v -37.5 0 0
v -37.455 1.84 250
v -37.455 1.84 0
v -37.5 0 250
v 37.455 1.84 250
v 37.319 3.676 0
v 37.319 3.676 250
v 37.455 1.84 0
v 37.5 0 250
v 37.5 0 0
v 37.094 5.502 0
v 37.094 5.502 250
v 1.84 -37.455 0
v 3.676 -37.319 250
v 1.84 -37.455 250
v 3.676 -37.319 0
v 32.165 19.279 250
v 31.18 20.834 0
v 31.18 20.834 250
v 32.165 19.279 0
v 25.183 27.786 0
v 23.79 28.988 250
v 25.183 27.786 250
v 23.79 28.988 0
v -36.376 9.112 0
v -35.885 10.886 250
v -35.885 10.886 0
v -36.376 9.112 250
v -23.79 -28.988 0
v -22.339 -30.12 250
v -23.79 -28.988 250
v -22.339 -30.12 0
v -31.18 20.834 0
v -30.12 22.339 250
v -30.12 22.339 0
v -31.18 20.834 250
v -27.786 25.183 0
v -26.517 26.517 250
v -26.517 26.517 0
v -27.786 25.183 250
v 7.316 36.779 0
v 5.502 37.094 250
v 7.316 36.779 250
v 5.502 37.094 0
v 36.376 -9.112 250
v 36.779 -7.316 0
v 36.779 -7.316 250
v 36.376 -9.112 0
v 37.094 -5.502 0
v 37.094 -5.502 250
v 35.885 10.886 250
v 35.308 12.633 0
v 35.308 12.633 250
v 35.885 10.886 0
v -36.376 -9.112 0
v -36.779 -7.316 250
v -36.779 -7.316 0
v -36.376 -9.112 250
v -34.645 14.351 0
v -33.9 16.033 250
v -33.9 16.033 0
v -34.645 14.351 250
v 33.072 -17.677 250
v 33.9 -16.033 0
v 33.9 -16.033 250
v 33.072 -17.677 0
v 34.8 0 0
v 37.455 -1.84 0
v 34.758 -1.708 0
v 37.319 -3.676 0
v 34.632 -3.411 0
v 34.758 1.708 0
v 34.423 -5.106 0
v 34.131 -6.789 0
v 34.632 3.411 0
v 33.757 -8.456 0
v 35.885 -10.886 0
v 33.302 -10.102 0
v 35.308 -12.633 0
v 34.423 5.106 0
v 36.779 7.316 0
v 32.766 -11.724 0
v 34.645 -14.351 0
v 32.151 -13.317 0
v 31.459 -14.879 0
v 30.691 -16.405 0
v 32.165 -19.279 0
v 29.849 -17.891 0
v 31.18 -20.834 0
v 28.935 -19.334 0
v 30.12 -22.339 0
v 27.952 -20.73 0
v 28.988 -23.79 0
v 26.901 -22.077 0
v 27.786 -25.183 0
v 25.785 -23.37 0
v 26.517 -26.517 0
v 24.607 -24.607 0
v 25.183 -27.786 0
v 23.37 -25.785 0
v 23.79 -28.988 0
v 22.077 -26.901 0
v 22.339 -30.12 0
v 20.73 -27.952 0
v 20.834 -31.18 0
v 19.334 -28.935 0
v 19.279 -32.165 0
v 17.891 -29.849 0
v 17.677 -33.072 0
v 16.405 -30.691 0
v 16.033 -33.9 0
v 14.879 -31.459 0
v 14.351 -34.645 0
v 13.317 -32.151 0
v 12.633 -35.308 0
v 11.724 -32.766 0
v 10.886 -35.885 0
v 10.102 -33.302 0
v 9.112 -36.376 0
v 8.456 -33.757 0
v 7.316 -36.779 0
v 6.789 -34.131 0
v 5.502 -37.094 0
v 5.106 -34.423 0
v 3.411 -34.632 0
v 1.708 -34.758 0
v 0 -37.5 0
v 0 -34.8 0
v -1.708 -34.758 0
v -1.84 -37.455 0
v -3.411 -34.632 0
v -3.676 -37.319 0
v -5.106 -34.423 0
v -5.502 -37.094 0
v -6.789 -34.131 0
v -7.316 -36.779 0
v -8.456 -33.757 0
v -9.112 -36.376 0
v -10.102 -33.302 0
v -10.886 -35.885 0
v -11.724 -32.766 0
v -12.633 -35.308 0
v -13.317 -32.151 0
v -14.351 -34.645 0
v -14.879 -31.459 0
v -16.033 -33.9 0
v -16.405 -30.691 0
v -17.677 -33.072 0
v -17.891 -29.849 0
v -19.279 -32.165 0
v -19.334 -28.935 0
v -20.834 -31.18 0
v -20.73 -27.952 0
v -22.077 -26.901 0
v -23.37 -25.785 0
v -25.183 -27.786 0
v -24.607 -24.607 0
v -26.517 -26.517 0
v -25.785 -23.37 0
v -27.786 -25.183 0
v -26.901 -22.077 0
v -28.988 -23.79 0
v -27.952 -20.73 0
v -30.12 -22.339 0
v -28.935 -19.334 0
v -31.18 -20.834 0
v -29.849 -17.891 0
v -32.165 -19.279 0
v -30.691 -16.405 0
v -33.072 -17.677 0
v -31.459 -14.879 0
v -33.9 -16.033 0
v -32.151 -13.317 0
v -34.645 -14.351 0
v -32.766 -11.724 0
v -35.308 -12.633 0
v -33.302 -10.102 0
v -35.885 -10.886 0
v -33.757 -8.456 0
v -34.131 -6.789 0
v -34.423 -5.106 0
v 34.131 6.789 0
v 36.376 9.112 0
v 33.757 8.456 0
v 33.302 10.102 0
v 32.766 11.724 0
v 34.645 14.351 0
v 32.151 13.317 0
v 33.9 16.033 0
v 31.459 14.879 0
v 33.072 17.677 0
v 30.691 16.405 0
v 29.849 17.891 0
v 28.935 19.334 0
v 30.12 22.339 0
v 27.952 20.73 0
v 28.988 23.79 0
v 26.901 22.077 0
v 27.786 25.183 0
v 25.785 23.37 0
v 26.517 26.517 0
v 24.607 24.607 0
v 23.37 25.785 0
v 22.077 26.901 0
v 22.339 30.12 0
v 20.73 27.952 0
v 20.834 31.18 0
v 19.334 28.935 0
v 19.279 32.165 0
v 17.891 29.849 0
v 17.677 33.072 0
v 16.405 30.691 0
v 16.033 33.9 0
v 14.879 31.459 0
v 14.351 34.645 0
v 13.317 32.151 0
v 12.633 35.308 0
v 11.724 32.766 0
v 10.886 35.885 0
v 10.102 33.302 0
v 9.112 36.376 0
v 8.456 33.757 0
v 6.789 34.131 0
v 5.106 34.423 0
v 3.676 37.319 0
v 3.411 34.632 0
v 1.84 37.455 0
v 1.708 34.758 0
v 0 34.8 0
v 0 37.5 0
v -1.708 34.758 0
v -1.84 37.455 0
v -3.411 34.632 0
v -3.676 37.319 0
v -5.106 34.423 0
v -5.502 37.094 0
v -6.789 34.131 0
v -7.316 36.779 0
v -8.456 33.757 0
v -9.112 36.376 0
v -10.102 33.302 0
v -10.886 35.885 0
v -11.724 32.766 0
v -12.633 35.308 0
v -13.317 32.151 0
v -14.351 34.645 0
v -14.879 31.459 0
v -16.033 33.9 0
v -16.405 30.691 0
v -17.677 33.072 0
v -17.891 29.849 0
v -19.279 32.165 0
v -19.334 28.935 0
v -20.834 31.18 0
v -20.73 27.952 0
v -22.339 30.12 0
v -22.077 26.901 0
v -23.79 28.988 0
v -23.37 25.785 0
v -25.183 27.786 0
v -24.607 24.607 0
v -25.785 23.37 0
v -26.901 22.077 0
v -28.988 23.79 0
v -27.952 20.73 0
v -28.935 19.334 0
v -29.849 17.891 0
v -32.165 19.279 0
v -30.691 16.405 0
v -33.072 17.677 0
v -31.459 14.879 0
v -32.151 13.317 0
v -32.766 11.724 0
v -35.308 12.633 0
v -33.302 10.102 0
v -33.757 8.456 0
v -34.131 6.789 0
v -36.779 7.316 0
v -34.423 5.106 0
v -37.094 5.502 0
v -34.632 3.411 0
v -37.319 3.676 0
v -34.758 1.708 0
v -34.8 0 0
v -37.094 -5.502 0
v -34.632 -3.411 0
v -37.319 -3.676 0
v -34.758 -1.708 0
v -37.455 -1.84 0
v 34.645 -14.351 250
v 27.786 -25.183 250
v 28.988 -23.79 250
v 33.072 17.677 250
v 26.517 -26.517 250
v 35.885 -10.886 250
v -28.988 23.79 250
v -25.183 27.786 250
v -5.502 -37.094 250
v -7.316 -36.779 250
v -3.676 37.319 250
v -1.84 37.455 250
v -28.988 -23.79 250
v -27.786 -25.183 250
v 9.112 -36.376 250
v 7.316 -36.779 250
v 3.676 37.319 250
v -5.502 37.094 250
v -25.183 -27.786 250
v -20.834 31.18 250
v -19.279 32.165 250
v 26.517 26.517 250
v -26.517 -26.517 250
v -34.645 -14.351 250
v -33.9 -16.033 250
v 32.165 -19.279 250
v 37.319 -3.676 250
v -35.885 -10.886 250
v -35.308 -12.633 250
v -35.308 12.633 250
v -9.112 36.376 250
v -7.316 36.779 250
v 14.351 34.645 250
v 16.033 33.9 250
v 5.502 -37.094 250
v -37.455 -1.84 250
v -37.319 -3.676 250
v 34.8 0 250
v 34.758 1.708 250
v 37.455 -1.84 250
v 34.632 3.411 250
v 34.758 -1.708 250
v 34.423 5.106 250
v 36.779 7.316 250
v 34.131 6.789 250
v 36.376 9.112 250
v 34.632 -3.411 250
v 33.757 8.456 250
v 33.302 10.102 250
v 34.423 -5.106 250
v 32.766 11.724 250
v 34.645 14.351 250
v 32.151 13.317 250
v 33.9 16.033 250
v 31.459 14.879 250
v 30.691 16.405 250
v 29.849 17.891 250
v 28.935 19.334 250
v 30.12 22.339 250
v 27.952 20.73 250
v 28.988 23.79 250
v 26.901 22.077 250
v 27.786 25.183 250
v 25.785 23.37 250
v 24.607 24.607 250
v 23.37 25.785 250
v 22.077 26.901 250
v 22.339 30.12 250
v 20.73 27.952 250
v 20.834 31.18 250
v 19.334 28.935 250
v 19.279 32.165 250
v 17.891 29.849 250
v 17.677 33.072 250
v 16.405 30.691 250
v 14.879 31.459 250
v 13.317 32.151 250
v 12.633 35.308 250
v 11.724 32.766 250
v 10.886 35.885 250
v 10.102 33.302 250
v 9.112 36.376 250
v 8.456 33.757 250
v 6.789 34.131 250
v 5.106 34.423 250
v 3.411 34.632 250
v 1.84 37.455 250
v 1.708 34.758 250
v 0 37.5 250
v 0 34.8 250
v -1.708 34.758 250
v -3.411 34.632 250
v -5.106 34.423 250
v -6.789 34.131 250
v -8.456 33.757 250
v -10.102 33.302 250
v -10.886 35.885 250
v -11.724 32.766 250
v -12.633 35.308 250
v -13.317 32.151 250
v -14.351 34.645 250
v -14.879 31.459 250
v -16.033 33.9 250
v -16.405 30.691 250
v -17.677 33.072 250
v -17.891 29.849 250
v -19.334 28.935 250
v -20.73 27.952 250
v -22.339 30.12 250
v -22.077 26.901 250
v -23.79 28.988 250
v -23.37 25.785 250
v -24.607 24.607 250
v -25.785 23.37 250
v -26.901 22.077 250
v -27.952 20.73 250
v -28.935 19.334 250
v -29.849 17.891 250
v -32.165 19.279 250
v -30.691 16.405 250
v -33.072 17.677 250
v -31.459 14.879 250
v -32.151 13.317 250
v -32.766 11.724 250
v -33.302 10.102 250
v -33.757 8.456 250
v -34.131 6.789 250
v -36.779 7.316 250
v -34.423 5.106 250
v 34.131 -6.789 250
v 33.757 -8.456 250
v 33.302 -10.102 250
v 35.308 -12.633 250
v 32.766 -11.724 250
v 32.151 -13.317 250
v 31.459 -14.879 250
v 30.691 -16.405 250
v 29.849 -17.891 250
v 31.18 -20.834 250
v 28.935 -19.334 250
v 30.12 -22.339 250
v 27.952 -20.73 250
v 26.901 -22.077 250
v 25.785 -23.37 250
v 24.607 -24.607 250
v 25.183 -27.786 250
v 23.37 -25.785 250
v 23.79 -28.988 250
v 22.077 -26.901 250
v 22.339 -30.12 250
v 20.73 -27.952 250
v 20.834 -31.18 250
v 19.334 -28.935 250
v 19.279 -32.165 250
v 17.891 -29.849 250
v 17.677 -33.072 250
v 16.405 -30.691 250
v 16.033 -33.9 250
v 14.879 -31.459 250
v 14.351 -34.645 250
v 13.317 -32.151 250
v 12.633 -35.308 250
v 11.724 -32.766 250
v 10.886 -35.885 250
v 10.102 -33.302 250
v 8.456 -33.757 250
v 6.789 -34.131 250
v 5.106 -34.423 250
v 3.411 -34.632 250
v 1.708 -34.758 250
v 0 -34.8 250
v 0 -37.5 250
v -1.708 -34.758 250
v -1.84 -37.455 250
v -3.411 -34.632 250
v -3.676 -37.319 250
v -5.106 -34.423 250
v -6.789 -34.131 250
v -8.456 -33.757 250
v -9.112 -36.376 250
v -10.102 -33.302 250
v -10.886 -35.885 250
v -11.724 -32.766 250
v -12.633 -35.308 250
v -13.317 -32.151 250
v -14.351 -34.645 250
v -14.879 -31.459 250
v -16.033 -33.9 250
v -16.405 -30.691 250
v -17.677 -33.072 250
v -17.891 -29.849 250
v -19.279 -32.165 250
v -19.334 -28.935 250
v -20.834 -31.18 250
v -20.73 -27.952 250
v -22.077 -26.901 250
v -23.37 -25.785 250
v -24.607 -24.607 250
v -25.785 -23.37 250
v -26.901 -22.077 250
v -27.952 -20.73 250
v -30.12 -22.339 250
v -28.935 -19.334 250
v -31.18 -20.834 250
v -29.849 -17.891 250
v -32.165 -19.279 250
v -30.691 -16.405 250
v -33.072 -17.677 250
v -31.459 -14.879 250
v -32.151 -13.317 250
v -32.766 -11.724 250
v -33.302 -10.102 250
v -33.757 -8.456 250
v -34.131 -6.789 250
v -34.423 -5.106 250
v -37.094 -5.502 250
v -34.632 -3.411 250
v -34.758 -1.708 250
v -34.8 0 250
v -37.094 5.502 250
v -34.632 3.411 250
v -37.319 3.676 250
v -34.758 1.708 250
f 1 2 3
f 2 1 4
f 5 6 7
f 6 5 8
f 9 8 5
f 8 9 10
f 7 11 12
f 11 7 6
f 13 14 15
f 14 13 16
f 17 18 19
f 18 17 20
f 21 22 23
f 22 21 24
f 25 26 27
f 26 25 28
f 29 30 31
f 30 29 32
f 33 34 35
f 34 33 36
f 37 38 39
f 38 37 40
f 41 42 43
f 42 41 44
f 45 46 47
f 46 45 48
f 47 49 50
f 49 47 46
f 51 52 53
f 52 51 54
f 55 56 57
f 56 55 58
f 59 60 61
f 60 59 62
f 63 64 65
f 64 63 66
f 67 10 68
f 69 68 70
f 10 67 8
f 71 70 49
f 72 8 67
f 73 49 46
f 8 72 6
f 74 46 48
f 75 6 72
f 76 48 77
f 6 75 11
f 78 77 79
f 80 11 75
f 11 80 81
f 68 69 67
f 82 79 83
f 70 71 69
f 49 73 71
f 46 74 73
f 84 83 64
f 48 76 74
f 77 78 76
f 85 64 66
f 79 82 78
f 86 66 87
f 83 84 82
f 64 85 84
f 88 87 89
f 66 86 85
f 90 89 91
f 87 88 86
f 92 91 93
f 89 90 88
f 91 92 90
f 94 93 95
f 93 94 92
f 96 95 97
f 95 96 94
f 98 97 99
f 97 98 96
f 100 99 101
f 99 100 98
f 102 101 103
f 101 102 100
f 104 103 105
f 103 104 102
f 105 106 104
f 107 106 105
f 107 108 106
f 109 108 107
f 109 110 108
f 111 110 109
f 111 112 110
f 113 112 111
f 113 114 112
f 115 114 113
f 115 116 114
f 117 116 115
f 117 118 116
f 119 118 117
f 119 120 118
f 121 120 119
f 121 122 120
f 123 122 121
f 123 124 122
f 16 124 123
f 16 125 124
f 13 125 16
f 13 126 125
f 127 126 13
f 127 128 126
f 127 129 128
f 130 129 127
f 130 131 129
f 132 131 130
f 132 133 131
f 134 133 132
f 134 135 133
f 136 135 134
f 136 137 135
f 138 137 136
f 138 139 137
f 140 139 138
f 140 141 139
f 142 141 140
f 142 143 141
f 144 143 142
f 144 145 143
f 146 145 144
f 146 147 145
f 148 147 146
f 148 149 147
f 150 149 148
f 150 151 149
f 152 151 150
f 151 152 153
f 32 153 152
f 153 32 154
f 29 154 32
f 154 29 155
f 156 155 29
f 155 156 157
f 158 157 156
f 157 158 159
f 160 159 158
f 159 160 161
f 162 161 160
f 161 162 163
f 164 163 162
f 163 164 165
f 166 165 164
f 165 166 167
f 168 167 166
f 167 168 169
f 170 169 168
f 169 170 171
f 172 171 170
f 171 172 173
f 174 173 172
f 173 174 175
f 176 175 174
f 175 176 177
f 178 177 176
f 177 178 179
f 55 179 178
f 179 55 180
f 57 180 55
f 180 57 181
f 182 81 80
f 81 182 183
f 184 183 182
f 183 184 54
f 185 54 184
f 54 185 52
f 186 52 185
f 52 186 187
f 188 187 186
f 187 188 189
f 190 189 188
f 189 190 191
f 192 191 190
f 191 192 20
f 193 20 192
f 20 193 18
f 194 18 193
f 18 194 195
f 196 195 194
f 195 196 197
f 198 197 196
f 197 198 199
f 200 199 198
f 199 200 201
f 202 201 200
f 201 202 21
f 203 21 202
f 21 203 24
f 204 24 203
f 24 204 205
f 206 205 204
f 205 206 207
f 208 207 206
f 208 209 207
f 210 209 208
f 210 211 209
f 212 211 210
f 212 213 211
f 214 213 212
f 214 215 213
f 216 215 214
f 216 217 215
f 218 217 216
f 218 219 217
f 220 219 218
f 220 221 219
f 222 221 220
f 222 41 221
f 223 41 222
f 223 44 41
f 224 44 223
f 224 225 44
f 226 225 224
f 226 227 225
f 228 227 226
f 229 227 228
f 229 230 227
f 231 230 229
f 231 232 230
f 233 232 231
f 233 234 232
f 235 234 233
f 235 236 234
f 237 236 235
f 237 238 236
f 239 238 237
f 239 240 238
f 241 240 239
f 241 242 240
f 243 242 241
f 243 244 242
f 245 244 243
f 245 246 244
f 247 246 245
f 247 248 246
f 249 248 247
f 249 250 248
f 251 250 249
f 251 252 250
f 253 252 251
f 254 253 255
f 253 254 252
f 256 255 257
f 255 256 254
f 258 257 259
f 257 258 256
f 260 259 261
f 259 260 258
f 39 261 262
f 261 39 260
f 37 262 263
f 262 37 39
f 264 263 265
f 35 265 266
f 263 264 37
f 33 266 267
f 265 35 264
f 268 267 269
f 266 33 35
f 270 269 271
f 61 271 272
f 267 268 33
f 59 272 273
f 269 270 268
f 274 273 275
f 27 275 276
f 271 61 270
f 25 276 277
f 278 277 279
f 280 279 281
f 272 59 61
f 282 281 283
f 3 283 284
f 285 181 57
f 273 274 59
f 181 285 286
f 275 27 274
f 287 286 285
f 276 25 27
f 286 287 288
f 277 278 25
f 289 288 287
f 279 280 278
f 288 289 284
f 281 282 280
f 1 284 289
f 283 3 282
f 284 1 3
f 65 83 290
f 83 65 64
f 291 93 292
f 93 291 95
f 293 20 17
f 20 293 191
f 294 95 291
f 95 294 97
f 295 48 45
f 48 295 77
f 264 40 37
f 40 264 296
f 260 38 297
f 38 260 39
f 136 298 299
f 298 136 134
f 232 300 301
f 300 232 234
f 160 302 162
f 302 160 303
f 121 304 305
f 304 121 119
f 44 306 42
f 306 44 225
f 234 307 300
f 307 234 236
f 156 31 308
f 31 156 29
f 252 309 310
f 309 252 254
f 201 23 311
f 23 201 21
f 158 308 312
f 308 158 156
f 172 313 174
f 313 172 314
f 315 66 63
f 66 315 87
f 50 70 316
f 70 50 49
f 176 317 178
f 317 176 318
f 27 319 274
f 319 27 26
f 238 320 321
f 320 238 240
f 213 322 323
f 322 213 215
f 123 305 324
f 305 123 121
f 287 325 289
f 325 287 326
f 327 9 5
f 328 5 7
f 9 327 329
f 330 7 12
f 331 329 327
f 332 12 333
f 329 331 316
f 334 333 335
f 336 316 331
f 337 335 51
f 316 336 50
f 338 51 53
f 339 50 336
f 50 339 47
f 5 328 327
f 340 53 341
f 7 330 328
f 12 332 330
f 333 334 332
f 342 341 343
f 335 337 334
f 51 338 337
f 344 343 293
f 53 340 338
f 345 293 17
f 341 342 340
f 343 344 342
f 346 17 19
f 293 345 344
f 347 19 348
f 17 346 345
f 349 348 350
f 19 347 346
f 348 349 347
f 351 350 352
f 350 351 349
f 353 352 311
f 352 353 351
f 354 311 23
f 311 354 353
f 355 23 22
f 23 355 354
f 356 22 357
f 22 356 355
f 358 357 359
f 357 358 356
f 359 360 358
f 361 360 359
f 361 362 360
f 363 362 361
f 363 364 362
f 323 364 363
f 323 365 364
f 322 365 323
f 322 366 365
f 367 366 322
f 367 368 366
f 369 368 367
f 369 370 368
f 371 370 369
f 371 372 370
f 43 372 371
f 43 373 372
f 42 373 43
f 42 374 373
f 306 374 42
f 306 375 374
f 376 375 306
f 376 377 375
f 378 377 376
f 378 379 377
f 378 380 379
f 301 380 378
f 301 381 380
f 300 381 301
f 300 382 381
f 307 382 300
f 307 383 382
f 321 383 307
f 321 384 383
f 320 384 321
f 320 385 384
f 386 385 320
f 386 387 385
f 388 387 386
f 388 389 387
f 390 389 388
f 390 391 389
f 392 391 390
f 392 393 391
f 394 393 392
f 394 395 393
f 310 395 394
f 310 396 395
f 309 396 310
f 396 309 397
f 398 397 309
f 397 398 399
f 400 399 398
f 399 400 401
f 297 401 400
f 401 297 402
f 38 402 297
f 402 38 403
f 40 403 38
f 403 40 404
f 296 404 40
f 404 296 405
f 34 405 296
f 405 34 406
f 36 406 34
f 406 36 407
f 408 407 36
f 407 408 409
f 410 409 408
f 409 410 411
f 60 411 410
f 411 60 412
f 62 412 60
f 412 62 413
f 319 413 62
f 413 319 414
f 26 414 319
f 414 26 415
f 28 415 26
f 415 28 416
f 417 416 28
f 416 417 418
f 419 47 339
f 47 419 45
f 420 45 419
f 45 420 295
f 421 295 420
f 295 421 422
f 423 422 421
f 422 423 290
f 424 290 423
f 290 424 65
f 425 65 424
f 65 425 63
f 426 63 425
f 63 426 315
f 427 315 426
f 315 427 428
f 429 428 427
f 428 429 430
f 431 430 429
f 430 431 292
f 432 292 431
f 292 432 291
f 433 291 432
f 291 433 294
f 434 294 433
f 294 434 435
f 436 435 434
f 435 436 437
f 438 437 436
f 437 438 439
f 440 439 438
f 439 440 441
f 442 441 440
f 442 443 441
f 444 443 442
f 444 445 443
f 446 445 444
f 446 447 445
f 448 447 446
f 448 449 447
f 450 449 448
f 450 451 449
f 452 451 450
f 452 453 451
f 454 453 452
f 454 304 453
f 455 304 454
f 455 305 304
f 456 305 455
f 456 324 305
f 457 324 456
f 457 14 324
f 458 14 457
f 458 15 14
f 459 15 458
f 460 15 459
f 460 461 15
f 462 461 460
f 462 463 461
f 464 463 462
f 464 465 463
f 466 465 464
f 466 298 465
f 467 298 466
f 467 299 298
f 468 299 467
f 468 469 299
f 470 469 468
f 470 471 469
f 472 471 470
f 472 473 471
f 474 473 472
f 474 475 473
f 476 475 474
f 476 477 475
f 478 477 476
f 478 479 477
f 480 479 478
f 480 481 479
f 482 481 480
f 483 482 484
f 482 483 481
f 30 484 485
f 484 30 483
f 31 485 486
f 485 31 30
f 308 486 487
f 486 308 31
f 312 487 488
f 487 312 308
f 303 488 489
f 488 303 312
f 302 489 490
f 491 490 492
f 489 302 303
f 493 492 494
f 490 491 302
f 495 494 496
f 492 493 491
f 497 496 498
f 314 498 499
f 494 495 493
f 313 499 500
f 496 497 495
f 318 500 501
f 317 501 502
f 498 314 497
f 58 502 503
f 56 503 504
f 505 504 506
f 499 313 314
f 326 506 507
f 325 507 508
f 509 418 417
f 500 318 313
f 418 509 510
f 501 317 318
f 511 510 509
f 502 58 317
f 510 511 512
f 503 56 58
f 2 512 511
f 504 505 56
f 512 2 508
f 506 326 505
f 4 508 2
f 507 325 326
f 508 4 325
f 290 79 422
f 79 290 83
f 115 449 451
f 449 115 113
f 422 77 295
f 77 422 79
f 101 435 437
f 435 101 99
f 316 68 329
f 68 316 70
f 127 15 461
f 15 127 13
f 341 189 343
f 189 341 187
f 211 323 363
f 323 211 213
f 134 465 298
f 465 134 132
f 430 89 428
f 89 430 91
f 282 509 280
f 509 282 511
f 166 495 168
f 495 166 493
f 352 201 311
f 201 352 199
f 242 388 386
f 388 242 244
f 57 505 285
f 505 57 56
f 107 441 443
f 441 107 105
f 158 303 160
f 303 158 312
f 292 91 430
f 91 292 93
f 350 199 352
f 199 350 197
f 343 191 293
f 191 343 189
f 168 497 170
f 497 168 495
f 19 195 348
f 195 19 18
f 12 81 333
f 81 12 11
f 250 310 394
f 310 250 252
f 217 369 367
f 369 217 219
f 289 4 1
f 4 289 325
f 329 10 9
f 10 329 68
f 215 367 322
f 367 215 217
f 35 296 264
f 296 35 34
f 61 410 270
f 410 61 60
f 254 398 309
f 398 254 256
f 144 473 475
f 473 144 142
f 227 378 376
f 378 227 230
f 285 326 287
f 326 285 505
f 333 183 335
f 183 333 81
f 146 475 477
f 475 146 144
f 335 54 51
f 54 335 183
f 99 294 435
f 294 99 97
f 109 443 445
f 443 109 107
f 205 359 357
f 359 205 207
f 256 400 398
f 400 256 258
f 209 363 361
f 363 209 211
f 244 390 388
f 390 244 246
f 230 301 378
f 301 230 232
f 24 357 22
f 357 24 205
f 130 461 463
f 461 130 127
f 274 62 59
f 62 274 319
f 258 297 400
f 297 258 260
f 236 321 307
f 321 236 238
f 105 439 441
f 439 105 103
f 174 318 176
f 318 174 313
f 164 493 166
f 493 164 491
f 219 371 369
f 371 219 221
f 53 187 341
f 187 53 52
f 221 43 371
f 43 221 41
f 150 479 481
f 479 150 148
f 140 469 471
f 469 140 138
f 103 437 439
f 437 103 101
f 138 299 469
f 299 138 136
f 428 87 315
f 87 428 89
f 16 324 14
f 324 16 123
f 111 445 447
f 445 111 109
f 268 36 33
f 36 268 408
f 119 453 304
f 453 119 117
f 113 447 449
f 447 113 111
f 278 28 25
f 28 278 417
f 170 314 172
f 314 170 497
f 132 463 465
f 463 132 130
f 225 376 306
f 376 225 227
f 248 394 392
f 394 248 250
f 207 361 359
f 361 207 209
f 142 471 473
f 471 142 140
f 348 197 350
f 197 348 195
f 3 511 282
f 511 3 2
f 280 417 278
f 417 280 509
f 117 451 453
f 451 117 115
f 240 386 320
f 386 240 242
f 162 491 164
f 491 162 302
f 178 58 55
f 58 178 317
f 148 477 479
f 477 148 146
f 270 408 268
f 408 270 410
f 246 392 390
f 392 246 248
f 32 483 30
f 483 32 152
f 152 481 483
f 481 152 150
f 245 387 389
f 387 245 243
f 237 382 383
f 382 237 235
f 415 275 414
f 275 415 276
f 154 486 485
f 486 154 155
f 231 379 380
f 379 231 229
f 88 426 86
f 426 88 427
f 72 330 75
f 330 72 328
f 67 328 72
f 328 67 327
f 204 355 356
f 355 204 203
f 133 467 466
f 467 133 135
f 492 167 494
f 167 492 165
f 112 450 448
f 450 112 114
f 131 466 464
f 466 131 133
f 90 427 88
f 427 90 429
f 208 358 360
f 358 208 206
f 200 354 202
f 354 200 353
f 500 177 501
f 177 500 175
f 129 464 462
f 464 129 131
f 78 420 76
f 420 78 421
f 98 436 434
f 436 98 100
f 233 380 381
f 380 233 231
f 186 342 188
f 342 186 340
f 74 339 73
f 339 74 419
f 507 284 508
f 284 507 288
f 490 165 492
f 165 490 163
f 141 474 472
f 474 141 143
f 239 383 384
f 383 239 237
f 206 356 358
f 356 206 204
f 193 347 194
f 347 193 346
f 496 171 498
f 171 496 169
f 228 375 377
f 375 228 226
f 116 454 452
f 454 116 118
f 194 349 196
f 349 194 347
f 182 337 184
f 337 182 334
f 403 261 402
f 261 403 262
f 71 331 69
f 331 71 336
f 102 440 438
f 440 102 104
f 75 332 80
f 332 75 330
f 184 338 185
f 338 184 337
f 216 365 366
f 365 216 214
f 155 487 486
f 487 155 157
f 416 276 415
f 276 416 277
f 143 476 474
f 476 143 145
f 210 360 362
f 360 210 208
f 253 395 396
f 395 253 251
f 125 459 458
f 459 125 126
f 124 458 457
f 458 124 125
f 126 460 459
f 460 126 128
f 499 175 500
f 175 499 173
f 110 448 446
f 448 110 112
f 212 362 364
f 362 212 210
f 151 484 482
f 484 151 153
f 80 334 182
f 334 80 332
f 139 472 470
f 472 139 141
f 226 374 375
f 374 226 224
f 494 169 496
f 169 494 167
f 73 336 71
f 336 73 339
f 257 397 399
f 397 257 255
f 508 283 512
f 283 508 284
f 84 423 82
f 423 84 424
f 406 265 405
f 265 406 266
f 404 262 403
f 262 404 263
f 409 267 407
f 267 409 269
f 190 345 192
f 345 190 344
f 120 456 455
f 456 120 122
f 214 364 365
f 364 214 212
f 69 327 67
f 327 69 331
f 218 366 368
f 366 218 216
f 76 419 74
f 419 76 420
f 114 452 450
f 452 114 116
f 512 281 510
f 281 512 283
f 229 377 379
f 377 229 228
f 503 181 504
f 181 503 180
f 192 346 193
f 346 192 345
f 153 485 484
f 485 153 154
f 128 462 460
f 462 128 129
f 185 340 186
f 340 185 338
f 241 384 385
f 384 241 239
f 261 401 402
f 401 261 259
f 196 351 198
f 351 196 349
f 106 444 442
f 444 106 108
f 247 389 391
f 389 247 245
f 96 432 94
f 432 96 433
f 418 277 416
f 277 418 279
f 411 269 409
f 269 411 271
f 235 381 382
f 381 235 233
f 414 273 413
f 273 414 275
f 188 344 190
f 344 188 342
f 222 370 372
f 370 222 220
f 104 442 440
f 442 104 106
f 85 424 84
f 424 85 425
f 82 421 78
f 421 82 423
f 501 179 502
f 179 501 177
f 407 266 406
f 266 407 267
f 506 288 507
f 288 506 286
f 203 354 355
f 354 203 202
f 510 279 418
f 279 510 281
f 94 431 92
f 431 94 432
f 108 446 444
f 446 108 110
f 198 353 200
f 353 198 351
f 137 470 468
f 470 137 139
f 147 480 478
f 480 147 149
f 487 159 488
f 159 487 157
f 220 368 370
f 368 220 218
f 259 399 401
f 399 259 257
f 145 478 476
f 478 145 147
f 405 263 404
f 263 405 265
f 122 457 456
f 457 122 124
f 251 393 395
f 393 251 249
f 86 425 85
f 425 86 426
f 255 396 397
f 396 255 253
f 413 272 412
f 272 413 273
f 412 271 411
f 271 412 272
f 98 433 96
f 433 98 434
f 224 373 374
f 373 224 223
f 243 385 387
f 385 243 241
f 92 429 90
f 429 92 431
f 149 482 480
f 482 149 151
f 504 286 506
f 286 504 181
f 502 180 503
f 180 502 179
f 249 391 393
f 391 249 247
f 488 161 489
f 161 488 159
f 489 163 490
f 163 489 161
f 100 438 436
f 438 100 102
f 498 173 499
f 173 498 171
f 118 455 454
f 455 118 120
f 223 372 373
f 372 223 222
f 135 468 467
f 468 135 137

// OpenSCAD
$fn = 128;

// HT pipe parameters (approximate for HT 75)
od = 75;          // outer diameter (mm)
wall = 2.7;       // wall thickness (mm) typical for HT DN75
len = 250;        // length (mm)

id = od - 2*wall;

module ht_pipe(od, id, len) {
    difference() {
        cylinder(h = len, d = od);
        translate([0,0,-0.1])
            cylinder(h = len + 0.2, d = id);
    }
}

ht_pipe(od, id, len);
